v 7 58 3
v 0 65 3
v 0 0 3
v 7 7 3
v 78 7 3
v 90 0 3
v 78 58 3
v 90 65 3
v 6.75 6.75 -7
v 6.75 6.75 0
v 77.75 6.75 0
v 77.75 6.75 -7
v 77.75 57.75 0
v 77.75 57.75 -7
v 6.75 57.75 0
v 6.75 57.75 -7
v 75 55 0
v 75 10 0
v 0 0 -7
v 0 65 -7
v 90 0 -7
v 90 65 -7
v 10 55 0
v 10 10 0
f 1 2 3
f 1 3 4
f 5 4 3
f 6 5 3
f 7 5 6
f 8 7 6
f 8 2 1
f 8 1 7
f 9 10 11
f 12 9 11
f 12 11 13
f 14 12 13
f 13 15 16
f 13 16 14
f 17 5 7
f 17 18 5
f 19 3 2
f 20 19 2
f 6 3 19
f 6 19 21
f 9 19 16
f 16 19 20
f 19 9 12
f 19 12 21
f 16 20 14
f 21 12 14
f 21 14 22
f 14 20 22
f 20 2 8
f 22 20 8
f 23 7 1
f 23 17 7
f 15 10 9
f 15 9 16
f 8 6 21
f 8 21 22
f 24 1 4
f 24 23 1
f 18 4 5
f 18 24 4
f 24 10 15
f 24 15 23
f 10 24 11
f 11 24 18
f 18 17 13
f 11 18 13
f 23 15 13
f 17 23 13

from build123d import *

# Parameters (mm, degrees)
SKETCH_W     = 90
SKETCH_H     = 65
PAD_DEPTH    = 10
SKETCH004_W  = 71
SKETCH004_H  = 51
POCKET_DEPTH = 7
SKETCH003_W  = 71
SKETCH003_H  = 51
SKETCH001_W  = 65
SKETCH001_H  = 45


with BuildPart() as part:
    # Sketch → Pad (new body)
    with BuildSketch(Plane.XY.offset(3)):
        with Locations((45, 32.5)):
            Rectangle(SKETCH_W, SKETCH_H)
    extrude(amount=-PAD_DEPTH)

    # Sketch004 → Pocket (cut)
    with BuildSketch(Plane.XY):
        with Locations((42.25, 32.25)):
            Rectangle(SKETCH004_W, SKETCH004_H)
    extrude(amount=-POCKET_DEPTH, mode=Mode.SUBTRACT)

    # Sketch003 → SubtractiveLoft section 0
    with BuildSketch(Plane.XY.offset(3)):
        with Locations((42.5, 32.5)):
            Rectangle(SKETCH003_W, SKETCH003_H)
    # Sketch001 → SubtractiveLoft section 1
    with BuildSketch(Plane.XY):
        with Locations((42.5, 32.5)):
            Rectangle(SKETCH001_W, SKETCH001_H)
    loft(mode=Mode.SUBTRACT)


solid = part.part
